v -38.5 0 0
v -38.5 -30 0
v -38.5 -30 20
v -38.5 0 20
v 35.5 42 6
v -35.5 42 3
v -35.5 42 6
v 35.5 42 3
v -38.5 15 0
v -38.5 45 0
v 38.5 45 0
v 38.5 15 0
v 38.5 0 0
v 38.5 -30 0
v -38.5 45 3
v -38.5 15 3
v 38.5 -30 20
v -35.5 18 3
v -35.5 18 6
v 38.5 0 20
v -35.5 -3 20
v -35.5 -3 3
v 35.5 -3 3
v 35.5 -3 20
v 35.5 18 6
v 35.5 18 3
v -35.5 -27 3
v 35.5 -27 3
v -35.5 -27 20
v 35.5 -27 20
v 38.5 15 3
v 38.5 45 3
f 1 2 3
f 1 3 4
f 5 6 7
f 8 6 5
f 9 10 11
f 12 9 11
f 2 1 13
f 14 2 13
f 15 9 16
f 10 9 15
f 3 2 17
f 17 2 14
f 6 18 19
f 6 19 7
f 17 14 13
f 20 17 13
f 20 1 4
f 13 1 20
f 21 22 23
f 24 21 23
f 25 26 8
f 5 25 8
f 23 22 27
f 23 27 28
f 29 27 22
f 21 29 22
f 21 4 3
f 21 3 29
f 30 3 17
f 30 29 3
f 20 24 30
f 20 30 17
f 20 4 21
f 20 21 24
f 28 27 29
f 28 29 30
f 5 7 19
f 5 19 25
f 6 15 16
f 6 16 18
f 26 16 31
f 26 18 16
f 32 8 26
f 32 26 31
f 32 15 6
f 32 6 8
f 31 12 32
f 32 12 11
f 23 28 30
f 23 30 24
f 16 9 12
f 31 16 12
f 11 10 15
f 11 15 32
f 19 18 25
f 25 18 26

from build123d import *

# Parameters (mm, degrees)
F0_W     = 77
F0_H     = 30
F0_W_2   = 71
F0_H_2   = 24
F1_DEPTH = 20
F2_DEPTH = 3
F3_DEPTH = 6


with BuildPart() as f1:
    # F0 (on Top) → F1 (new body)
    with BuildSketch(Plane.XY):
        with Locations((0, -15)):
            Rectangle(F0_W, F0_H)
        with Locations((0, -15)):
            Rectangle(F0_W_2, F0_H_2, mode=Mode.SUBTRACT)
    extrude(amount=F1_DEPTH)

    # F0 (on Top) → F2 (join)
    with BuildSketch(Plane.XY):
        with Locations((0, -15)):
            Rectangle(F0_W_2, F0_H_2)
        with Locations((0, 30)):
            Rectangle(F0_W, F0_H)
        with Locations((0, 30)):
            Rectangle(F0_W_2, F0_H_2, mode=Mode.SUBTRACT)
    extrude(amount=F2_DEPTH)

    # F0 (on Top) → F3 (join)
    with BuildSketch(Plane.XY):
        with Locations((0, 30)):
            Rectangle(F0_W_2, F0_H_2)
    extrude(amount=F3_DEPTH)


solid = f1.part
